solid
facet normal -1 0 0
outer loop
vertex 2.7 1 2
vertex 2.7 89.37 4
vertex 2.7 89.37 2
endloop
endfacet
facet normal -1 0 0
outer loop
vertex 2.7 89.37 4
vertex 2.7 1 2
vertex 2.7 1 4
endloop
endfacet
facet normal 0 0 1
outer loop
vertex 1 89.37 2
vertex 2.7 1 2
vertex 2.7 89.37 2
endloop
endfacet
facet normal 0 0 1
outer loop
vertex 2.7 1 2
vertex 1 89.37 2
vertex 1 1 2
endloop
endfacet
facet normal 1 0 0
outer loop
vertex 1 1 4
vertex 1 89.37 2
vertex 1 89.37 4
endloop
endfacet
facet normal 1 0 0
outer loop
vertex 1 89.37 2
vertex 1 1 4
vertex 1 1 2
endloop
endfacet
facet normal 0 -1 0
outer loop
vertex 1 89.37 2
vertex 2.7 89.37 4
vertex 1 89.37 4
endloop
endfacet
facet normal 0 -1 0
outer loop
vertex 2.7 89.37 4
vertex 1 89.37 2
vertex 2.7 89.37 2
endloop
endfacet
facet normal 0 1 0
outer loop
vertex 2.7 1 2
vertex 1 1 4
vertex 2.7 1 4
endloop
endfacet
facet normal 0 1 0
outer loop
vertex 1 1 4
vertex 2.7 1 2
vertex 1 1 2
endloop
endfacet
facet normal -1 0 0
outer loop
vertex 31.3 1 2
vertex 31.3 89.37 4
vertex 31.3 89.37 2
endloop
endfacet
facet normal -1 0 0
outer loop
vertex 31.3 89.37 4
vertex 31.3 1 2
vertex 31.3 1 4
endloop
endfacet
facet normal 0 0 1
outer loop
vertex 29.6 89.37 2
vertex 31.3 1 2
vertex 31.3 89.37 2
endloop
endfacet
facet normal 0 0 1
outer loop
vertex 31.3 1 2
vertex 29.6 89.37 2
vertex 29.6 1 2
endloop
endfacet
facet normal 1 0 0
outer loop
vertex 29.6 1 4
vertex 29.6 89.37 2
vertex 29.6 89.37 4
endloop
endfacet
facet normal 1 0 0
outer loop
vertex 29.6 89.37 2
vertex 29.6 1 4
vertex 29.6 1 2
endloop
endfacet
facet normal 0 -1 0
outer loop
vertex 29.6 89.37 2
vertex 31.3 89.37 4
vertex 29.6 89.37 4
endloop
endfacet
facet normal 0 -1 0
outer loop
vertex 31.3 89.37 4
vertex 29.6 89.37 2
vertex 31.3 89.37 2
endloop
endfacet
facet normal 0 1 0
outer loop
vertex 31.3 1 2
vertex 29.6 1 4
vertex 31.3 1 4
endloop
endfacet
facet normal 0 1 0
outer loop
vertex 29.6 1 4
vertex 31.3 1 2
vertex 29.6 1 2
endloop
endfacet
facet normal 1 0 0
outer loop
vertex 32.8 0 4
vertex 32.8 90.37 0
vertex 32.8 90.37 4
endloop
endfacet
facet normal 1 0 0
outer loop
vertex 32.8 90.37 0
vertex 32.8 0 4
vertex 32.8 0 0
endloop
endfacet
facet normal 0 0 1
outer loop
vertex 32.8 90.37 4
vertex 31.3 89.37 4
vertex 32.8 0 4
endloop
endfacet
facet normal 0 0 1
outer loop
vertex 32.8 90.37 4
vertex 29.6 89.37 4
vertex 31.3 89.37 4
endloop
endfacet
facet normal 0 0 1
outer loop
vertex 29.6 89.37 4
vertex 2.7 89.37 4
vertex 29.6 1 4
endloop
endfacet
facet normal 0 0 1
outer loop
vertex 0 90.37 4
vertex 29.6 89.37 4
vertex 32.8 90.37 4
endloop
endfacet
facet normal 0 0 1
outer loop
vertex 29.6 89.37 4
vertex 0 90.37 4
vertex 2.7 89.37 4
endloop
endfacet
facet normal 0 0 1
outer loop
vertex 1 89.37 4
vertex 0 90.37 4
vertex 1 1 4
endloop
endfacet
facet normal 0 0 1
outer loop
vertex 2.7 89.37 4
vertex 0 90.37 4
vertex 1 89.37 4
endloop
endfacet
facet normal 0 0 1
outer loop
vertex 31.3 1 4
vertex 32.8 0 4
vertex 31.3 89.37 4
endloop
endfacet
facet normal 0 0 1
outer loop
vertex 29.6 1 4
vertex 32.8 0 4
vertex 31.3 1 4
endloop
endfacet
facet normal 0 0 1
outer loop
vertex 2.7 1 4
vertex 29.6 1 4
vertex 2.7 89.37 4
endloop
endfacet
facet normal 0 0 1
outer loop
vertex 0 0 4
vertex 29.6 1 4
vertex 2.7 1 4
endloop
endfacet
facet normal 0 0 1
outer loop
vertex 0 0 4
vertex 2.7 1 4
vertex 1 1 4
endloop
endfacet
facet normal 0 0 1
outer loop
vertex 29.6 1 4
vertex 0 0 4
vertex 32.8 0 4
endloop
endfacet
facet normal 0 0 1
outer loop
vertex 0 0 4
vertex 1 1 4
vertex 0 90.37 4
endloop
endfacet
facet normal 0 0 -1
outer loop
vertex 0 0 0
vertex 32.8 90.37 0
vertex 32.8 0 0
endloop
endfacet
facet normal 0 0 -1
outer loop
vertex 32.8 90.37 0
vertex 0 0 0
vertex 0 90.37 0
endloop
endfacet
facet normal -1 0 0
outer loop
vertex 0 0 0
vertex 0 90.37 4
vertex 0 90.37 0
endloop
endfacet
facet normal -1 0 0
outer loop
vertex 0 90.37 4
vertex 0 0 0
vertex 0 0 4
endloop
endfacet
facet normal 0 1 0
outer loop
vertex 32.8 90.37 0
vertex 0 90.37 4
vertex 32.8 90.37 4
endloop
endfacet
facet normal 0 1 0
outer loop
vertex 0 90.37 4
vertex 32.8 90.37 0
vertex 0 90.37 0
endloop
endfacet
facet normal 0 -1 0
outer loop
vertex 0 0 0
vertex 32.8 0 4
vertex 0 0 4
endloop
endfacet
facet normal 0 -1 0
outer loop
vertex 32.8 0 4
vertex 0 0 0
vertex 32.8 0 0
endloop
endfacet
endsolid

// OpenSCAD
// distance between sensors is 28.6 on the inside and 30.16
// on the outside, roughly checking out with their ~1mm width.
gap = 28.6;
sensorw = 1.1;

outl = 88.37;
thick = sensorw + 0.6;
h = 4;

difference(){
	cube([gap + 2 * (1 + sensorw), outl + 2, h]);
	union(){
		translate([1, 1, 2]){
			cube([thick, outl, h]);
		}
		translate([1 + gap, 1, 2]){
			cube([thick, outl, h]);
		}
	}
}
